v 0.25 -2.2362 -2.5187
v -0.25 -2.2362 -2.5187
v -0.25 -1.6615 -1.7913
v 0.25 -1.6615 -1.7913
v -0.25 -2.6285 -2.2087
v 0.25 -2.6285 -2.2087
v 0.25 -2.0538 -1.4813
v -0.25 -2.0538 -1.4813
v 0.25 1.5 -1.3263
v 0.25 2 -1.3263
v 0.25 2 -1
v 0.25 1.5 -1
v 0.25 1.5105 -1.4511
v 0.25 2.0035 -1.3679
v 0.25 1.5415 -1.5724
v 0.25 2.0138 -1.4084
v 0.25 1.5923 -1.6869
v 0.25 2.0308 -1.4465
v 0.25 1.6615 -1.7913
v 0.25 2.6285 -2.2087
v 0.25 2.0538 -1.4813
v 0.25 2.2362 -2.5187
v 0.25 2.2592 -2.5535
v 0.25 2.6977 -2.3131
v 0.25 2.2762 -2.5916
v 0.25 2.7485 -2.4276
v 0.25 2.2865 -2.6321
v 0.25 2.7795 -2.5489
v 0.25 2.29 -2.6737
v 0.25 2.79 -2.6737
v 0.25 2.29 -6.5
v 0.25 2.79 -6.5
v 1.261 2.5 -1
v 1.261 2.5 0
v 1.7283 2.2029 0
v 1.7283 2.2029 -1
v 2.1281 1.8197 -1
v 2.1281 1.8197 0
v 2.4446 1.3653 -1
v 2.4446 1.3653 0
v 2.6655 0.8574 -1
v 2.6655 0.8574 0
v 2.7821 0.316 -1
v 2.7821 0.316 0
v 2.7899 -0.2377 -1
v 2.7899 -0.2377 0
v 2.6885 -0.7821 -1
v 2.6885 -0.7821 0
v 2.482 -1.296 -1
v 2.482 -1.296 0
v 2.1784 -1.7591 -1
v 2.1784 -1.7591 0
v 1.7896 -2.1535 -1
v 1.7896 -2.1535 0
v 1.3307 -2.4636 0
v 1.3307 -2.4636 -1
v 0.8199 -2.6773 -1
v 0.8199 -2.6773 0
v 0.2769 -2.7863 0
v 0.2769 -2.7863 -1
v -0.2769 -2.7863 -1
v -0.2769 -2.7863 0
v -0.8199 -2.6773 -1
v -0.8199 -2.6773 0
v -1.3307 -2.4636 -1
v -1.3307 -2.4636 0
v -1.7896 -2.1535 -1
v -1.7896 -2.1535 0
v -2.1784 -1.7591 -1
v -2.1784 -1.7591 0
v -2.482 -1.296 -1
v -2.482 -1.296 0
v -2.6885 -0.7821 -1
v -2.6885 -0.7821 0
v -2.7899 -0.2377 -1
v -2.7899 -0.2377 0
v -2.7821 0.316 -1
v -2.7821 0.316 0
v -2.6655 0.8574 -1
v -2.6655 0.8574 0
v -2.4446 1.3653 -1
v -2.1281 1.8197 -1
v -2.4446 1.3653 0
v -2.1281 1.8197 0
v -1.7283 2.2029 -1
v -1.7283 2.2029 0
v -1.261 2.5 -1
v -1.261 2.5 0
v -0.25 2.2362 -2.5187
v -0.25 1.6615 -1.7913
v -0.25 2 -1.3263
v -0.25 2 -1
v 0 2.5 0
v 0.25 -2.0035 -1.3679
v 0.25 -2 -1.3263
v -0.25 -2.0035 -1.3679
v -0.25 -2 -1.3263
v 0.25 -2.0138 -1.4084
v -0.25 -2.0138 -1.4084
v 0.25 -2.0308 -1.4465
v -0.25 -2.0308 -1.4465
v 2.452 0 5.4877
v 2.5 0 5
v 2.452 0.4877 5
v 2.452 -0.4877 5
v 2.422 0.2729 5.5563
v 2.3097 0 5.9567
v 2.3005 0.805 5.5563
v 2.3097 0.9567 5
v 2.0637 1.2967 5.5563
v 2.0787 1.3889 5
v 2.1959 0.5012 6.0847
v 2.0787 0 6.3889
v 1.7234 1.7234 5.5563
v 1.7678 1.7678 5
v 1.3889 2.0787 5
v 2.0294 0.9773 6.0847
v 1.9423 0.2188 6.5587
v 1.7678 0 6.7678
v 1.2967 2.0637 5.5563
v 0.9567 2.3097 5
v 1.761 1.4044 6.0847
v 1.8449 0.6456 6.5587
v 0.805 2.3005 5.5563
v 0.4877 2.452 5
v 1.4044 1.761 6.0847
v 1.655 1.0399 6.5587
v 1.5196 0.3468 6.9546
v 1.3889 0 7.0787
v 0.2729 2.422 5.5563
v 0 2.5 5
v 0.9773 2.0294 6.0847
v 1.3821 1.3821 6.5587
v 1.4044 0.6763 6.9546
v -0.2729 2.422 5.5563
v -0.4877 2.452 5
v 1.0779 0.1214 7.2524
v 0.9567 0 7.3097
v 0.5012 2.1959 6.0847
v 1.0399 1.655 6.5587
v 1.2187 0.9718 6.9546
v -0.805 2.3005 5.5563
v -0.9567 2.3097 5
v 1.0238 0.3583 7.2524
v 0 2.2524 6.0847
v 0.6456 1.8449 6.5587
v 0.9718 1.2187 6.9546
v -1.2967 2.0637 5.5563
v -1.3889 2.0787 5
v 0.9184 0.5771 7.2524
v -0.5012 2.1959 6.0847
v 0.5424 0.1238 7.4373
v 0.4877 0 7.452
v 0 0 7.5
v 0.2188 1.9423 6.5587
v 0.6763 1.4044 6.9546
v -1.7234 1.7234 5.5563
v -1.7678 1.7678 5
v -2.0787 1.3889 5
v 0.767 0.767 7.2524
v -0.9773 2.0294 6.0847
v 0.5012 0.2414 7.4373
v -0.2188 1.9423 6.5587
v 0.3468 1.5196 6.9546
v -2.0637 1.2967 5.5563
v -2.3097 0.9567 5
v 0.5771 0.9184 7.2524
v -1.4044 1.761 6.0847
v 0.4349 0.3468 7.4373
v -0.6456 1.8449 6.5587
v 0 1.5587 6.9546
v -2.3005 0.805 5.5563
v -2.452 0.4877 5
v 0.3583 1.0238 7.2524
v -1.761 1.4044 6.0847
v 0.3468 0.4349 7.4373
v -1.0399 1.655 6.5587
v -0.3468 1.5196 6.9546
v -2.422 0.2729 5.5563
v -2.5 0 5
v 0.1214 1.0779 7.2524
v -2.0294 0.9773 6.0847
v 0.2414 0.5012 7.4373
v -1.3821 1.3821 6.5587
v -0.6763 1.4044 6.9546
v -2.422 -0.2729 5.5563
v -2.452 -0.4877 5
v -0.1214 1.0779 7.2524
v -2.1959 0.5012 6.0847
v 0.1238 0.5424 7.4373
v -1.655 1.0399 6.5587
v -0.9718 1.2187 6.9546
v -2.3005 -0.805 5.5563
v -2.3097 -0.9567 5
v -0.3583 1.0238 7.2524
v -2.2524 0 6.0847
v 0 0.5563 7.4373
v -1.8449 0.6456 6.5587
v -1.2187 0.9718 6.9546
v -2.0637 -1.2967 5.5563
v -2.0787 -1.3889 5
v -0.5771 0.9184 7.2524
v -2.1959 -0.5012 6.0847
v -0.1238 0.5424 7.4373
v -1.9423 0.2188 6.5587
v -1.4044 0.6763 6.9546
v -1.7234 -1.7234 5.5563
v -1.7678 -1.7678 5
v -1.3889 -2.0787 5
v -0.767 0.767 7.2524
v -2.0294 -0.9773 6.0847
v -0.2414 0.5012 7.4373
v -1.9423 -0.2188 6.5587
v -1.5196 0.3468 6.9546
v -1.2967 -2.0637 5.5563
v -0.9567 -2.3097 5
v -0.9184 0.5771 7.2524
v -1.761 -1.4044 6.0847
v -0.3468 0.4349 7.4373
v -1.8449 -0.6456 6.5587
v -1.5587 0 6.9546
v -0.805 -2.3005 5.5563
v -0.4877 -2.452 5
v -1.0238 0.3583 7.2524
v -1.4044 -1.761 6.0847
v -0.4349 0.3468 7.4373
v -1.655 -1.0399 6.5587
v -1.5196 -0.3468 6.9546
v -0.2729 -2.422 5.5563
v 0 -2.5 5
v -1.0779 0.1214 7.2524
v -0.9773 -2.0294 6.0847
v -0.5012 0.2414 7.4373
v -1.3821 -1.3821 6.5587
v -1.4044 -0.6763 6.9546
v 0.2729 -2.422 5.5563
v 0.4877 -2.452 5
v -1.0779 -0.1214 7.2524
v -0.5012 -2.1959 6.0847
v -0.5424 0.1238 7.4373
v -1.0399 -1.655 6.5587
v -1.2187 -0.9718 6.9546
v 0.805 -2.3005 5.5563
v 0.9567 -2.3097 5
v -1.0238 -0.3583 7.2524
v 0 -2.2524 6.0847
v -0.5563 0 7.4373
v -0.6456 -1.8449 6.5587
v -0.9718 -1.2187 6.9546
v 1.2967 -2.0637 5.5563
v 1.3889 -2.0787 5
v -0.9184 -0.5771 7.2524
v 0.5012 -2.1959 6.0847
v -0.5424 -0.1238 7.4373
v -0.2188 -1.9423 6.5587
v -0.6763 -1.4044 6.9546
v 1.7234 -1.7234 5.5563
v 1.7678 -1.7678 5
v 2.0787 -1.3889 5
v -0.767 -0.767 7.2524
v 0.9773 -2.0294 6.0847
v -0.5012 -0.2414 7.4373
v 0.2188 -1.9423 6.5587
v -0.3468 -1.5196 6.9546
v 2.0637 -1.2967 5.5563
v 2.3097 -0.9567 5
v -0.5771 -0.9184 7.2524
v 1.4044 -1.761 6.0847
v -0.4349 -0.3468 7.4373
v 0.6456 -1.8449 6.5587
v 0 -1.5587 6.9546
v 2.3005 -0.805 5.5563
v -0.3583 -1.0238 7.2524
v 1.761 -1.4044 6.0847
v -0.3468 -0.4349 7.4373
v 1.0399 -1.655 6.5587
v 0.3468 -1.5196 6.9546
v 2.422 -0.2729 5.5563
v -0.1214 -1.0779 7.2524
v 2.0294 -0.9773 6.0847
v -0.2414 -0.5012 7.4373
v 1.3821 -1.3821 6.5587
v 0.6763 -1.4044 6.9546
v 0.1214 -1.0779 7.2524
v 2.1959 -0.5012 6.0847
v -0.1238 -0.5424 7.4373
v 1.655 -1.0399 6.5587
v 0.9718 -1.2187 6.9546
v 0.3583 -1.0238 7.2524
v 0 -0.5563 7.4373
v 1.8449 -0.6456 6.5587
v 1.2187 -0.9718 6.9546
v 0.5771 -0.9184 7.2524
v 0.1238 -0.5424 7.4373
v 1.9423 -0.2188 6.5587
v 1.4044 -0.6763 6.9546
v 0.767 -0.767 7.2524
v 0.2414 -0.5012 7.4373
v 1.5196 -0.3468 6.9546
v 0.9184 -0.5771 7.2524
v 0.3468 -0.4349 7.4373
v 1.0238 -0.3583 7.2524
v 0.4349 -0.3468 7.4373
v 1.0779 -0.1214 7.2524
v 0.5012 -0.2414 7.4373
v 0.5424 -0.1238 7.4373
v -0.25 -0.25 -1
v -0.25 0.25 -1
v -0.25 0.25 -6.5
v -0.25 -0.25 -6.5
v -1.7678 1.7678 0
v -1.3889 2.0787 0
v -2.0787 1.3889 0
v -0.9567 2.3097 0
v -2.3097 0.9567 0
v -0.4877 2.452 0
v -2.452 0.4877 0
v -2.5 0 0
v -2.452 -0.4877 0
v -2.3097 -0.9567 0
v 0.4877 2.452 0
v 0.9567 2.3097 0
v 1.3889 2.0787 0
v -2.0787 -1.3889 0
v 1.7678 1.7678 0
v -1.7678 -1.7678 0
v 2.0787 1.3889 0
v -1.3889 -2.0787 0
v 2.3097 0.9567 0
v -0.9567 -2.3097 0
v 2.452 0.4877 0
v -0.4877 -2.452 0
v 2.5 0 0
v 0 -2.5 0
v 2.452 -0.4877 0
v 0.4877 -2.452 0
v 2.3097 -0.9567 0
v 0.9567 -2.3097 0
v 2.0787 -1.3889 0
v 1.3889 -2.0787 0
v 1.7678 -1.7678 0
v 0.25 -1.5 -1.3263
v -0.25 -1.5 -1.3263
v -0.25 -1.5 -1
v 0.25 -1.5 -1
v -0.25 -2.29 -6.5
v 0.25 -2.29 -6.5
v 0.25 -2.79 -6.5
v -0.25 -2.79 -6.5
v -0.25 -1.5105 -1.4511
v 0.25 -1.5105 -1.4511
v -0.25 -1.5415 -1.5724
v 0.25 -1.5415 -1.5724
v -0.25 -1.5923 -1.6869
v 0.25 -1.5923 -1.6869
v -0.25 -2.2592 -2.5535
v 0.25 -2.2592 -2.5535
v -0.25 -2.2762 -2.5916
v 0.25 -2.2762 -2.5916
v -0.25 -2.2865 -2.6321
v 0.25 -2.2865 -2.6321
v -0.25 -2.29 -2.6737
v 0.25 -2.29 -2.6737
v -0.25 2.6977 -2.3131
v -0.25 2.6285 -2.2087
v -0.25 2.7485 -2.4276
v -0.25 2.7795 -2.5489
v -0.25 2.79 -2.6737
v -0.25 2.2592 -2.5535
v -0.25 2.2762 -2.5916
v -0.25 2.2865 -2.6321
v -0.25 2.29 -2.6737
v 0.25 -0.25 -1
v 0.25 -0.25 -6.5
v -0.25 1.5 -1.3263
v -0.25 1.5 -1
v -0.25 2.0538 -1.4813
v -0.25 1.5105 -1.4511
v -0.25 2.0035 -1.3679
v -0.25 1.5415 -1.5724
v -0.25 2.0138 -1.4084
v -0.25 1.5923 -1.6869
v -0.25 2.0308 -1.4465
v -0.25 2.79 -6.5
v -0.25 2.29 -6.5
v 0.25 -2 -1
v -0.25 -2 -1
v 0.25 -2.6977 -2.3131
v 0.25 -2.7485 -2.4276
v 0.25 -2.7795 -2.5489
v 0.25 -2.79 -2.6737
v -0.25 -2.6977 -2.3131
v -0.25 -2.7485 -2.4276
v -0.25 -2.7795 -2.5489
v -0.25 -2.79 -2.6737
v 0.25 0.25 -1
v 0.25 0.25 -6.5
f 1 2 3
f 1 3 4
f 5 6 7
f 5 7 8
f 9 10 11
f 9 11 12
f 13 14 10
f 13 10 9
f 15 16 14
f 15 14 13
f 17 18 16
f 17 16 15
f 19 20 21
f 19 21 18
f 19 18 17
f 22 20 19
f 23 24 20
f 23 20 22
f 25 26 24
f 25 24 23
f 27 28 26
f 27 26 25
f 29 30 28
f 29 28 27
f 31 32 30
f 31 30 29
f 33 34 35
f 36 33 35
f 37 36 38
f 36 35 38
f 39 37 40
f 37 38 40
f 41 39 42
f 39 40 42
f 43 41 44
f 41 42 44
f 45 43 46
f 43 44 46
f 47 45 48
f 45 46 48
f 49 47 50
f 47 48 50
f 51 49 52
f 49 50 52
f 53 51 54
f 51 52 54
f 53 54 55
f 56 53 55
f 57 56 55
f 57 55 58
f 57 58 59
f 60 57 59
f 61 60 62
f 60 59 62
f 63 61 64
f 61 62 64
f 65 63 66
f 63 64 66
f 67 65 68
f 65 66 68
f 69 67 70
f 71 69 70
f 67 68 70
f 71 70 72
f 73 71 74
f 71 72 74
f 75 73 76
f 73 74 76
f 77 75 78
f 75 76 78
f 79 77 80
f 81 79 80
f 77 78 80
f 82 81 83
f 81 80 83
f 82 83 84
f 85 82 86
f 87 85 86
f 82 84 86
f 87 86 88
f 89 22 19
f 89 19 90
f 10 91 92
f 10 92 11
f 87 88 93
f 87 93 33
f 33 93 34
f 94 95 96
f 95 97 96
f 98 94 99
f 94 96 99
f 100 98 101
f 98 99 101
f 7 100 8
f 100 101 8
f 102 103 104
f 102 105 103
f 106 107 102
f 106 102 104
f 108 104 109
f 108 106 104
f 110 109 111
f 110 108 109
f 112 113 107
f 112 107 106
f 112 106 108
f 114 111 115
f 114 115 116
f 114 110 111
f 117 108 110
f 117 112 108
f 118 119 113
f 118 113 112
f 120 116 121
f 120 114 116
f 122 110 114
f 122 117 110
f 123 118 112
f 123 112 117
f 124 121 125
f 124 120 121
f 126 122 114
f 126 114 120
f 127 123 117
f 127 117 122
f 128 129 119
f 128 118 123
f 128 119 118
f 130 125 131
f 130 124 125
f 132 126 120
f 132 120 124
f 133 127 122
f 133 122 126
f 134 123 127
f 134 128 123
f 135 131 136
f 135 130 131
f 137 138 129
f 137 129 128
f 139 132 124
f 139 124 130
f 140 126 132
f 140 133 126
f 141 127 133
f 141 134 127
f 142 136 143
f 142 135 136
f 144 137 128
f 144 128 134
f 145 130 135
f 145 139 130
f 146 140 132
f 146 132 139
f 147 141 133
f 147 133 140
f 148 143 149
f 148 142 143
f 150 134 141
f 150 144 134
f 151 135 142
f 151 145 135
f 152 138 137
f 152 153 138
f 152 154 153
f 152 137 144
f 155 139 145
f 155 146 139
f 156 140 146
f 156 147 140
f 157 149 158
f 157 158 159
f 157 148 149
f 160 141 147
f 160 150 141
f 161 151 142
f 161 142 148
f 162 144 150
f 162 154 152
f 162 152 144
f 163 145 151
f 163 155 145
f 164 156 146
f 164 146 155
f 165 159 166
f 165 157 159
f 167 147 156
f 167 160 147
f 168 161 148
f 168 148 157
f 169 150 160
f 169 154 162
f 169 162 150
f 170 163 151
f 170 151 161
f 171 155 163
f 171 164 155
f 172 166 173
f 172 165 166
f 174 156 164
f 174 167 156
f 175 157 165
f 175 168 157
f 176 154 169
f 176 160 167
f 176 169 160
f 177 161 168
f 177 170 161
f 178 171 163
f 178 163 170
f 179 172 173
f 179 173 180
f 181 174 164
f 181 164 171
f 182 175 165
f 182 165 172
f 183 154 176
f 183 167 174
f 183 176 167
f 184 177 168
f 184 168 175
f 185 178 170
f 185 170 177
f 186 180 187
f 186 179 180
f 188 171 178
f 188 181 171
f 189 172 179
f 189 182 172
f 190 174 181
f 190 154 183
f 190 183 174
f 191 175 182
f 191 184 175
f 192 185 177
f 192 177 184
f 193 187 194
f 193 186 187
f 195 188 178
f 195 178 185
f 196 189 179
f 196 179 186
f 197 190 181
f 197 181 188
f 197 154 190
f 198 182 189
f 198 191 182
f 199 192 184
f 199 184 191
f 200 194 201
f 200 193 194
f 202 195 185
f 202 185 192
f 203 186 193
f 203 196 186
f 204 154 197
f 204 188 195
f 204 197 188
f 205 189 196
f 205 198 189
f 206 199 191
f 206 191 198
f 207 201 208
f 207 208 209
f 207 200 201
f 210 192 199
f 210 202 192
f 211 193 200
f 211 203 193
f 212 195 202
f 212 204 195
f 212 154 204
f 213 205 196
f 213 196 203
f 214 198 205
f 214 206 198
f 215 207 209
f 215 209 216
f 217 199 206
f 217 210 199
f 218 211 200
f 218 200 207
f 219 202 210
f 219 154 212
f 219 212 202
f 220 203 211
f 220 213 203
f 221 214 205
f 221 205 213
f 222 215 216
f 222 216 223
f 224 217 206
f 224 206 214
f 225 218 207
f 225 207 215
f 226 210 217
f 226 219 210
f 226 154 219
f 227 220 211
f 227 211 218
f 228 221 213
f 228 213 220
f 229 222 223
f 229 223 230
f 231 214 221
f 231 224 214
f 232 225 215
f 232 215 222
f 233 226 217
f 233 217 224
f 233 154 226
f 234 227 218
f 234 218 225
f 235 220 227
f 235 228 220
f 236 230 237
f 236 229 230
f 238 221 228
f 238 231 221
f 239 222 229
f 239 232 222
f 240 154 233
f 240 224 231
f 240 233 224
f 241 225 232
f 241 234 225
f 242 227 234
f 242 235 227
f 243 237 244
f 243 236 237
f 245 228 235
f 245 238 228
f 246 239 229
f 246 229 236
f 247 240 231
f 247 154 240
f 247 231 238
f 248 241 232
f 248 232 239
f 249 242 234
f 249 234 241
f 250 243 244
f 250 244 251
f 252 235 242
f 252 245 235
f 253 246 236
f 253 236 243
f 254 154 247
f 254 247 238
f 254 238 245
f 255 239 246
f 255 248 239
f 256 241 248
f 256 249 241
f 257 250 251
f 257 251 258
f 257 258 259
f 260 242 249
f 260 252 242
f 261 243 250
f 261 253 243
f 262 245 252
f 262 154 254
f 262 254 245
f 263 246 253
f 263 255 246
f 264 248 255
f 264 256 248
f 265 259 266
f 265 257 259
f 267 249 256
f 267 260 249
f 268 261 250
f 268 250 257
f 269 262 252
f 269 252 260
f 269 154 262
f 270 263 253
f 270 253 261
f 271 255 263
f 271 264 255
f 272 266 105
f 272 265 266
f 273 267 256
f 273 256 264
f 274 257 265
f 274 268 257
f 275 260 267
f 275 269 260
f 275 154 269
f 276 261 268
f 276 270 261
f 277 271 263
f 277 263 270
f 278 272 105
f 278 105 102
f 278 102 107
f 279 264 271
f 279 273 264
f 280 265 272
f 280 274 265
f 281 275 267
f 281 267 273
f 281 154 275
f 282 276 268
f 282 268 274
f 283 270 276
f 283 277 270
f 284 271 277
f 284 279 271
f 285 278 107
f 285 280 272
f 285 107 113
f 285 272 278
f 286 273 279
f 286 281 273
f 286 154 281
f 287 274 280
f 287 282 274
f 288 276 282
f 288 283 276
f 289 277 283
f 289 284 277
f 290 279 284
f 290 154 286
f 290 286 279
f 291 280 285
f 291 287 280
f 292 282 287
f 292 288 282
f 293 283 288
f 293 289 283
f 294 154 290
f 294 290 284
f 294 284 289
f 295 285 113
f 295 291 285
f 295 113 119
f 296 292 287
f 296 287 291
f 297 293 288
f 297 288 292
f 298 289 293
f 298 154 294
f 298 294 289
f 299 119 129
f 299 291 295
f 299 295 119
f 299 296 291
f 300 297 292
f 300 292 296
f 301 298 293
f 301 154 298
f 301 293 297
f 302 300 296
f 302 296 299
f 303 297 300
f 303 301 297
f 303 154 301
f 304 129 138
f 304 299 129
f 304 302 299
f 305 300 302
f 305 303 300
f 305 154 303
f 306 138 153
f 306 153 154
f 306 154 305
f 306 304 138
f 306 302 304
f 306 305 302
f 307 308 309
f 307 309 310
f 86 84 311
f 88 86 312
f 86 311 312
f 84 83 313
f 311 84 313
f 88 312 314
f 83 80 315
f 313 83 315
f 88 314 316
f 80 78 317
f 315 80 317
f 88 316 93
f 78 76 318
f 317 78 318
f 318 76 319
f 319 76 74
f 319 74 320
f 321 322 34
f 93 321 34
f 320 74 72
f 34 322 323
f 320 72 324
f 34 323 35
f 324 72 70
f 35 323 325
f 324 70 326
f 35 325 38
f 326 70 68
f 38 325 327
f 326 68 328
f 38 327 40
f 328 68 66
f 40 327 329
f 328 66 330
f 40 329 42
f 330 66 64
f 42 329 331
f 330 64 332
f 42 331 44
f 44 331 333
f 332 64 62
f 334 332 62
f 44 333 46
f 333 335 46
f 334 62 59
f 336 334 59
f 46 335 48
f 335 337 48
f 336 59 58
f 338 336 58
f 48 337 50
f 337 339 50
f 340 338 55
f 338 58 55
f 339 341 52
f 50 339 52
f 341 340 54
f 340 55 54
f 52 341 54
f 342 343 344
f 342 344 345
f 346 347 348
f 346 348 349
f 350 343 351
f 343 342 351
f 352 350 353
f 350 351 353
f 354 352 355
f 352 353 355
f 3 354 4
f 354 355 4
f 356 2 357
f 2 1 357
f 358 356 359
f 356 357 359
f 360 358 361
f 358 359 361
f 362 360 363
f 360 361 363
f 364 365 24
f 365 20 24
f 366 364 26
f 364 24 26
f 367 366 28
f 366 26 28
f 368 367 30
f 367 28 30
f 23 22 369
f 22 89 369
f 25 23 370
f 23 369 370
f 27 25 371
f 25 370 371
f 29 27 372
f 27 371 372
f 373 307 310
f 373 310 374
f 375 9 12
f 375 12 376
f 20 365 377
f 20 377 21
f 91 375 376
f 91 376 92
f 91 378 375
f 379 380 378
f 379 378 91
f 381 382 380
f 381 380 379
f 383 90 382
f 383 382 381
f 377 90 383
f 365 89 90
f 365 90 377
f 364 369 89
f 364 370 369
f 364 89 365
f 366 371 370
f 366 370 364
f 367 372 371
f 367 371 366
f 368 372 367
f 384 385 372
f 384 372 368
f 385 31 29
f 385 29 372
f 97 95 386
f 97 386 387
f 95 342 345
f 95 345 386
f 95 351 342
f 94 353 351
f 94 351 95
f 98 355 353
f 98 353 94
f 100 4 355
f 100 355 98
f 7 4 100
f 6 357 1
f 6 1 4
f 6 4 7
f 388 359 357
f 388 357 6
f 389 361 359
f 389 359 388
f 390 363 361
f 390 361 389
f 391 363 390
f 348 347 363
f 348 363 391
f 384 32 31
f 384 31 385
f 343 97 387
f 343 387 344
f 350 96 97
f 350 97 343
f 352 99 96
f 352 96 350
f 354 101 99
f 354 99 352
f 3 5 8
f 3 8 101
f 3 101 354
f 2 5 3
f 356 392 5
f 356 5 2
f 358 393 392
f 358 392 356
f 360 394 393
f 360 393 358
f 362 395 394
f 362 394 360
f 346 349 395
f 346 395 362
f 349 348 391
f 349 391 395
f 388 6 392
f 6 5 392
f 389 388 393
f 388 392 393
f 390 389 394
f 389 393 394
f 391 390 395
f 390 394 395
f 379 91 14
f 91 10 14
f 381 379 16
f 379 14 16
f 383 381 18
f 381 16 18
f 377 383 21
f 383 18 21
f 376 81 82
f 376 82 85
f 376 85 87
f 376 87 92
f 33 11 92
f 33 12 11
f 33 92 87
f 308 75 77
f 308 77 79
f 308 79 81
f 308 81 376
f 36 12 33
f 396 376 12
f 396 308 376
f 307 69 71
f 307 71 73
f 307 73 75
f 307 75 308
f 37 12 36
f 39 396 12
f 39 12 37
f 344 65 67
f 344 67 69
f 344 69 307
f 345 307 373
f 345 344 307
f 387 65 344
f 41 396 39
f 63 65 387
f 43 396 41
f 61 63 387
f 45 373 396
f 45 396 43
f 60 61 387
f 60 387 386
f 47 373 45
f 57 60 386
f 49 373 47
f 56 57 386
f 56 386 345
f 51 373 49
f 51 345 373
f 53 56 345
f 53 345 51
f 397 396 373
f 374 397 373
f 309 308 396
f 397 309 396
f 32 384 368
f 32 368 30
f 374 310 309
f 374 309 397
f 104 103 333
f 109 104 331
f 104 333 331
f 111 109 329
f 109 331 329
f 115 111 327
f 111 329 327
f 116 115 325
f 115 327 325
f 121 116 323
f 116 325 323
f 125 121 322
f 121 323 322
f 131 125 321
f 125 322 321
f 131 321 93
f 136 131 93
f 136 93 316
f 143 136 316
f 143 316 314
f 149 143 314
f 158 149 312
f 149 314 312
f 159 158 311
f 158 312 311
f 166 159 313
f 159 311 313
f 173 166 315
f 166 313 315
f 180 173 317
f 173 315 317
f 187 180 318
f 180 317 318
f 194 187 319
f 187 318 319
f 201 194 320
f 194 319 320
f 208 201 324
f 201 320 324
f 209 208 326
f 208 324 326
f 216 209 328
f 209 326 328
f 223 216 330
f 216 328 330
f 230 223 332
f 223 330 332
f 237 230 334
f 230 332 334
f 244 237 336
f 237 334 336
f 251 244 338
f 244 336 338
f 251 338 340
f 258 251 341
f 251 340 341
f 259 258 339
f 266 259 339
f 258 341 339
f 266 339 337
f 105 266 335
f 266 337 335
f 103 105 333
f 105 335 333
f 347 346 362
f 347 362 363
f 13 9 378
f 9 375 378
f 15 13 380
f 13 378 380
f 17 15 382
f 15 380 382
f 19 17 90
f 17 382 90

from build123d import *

# Parameters (mm, degrees)
F0_R     = 2.5
F1_DEPTH = 7.5
F2_R     = 2.5
F4_DEPTH = 1
F5_W     = 0.5
F5_H     = 0.5
F6_DEPTH = 5.5


with BuildPart() as f1:
    # F0 (on Top) → F1 (new body)
    with BuildSketch(Plane.XY):
        Circle(F0_R)
    extrude(amount=F1_DEPTH)

    # F2
    f2_edges = [f1.edges().sort_by_distance(p)[0] for p in [
        (-2.5, 0, 7.5),
    ]]
    fillet(f2_edges, radius=F2_R)

    # F3 (on face) → F4 (join)
    with BuildSketch(Plane(origin=(0, 0, 0), x_dir=(1, 0, 0), z_dir=(0, 0, -1))):
        with BuildLine():
            Line((-1.260952, -2.5), (1.260952, -2.5))
            ThreePointArc((1.260952, -2.5), (0, 2.8), (-1.260952, -2.5))
        make_face()
    extrude(amount=F4_DEPTH)

    # F5 (on face) → F6 (join)
    with BuildSketch(Plane(origin=(0, 0, -1), x_dir=(1, 0, 0), z_dir=(0, 0, -1))):
        Rectangle(F5_W, F5_H)
    extrude(amount=F6_DEPTH)

    # F8: sweep along a path in F7
    with BuildLine(Plane.YZ) as f8_path:
        Line((-1.75, -1), (-1.75, -1.326328))
        ThreePointArc((-1.75, -1.326328), (-1.777681, -1.490385), (-1.857659, -1.636277))
        Line((-1.857659, -1.636277), (-2.432341, -2.363723))
        ThreePointArc((-2.432341, -2.363723), (-2.512319, -2.509615), (-2.54, -2.673672))
        Line((-2.54, -2.673672), (-2.54, -6.5))
    # F5 (on face) → F8 (sweep)
    with BuildSketch(Plane(origin=(0, 0, -1), x_dir=(1, 0, 0), z_dir=(0, 0, -1))):
        with Locations((0, 1.75)):
            Rectangle(F5_W, F5_H)
    sweep(path=f8_path.line)

    # F9: sweep along a path in F7
    with BuildLine(Plane.YZ) as f9_path:
        Line((1.75, -1), (1.75, -1.326328))
        ThreePointArc((1.75, -1.326328), (1.777681, -1.490385), (1.857659, -1.636277))
        Line((1.857659, -1.636277), (2.432341, -2.363723))
        ThreePointArc((2.432341, -2.363723), (2.512319, -2.509615), (2.54, -2.673672))
        Line((2.54, -2.673672), (2.54, -6.5))
    # F5 (on face) → F9 (sweep)
    with BuildSketch(Plane(origin=(0, 0, -1), x_dir=(1, 0, 0), z_dir=(0, 0, -1))):
        with Locations((0, -1.75)):
            Rectangle(F5_W, F5_H)
    sweep(path=f9_path.line)


solid = f1.part
